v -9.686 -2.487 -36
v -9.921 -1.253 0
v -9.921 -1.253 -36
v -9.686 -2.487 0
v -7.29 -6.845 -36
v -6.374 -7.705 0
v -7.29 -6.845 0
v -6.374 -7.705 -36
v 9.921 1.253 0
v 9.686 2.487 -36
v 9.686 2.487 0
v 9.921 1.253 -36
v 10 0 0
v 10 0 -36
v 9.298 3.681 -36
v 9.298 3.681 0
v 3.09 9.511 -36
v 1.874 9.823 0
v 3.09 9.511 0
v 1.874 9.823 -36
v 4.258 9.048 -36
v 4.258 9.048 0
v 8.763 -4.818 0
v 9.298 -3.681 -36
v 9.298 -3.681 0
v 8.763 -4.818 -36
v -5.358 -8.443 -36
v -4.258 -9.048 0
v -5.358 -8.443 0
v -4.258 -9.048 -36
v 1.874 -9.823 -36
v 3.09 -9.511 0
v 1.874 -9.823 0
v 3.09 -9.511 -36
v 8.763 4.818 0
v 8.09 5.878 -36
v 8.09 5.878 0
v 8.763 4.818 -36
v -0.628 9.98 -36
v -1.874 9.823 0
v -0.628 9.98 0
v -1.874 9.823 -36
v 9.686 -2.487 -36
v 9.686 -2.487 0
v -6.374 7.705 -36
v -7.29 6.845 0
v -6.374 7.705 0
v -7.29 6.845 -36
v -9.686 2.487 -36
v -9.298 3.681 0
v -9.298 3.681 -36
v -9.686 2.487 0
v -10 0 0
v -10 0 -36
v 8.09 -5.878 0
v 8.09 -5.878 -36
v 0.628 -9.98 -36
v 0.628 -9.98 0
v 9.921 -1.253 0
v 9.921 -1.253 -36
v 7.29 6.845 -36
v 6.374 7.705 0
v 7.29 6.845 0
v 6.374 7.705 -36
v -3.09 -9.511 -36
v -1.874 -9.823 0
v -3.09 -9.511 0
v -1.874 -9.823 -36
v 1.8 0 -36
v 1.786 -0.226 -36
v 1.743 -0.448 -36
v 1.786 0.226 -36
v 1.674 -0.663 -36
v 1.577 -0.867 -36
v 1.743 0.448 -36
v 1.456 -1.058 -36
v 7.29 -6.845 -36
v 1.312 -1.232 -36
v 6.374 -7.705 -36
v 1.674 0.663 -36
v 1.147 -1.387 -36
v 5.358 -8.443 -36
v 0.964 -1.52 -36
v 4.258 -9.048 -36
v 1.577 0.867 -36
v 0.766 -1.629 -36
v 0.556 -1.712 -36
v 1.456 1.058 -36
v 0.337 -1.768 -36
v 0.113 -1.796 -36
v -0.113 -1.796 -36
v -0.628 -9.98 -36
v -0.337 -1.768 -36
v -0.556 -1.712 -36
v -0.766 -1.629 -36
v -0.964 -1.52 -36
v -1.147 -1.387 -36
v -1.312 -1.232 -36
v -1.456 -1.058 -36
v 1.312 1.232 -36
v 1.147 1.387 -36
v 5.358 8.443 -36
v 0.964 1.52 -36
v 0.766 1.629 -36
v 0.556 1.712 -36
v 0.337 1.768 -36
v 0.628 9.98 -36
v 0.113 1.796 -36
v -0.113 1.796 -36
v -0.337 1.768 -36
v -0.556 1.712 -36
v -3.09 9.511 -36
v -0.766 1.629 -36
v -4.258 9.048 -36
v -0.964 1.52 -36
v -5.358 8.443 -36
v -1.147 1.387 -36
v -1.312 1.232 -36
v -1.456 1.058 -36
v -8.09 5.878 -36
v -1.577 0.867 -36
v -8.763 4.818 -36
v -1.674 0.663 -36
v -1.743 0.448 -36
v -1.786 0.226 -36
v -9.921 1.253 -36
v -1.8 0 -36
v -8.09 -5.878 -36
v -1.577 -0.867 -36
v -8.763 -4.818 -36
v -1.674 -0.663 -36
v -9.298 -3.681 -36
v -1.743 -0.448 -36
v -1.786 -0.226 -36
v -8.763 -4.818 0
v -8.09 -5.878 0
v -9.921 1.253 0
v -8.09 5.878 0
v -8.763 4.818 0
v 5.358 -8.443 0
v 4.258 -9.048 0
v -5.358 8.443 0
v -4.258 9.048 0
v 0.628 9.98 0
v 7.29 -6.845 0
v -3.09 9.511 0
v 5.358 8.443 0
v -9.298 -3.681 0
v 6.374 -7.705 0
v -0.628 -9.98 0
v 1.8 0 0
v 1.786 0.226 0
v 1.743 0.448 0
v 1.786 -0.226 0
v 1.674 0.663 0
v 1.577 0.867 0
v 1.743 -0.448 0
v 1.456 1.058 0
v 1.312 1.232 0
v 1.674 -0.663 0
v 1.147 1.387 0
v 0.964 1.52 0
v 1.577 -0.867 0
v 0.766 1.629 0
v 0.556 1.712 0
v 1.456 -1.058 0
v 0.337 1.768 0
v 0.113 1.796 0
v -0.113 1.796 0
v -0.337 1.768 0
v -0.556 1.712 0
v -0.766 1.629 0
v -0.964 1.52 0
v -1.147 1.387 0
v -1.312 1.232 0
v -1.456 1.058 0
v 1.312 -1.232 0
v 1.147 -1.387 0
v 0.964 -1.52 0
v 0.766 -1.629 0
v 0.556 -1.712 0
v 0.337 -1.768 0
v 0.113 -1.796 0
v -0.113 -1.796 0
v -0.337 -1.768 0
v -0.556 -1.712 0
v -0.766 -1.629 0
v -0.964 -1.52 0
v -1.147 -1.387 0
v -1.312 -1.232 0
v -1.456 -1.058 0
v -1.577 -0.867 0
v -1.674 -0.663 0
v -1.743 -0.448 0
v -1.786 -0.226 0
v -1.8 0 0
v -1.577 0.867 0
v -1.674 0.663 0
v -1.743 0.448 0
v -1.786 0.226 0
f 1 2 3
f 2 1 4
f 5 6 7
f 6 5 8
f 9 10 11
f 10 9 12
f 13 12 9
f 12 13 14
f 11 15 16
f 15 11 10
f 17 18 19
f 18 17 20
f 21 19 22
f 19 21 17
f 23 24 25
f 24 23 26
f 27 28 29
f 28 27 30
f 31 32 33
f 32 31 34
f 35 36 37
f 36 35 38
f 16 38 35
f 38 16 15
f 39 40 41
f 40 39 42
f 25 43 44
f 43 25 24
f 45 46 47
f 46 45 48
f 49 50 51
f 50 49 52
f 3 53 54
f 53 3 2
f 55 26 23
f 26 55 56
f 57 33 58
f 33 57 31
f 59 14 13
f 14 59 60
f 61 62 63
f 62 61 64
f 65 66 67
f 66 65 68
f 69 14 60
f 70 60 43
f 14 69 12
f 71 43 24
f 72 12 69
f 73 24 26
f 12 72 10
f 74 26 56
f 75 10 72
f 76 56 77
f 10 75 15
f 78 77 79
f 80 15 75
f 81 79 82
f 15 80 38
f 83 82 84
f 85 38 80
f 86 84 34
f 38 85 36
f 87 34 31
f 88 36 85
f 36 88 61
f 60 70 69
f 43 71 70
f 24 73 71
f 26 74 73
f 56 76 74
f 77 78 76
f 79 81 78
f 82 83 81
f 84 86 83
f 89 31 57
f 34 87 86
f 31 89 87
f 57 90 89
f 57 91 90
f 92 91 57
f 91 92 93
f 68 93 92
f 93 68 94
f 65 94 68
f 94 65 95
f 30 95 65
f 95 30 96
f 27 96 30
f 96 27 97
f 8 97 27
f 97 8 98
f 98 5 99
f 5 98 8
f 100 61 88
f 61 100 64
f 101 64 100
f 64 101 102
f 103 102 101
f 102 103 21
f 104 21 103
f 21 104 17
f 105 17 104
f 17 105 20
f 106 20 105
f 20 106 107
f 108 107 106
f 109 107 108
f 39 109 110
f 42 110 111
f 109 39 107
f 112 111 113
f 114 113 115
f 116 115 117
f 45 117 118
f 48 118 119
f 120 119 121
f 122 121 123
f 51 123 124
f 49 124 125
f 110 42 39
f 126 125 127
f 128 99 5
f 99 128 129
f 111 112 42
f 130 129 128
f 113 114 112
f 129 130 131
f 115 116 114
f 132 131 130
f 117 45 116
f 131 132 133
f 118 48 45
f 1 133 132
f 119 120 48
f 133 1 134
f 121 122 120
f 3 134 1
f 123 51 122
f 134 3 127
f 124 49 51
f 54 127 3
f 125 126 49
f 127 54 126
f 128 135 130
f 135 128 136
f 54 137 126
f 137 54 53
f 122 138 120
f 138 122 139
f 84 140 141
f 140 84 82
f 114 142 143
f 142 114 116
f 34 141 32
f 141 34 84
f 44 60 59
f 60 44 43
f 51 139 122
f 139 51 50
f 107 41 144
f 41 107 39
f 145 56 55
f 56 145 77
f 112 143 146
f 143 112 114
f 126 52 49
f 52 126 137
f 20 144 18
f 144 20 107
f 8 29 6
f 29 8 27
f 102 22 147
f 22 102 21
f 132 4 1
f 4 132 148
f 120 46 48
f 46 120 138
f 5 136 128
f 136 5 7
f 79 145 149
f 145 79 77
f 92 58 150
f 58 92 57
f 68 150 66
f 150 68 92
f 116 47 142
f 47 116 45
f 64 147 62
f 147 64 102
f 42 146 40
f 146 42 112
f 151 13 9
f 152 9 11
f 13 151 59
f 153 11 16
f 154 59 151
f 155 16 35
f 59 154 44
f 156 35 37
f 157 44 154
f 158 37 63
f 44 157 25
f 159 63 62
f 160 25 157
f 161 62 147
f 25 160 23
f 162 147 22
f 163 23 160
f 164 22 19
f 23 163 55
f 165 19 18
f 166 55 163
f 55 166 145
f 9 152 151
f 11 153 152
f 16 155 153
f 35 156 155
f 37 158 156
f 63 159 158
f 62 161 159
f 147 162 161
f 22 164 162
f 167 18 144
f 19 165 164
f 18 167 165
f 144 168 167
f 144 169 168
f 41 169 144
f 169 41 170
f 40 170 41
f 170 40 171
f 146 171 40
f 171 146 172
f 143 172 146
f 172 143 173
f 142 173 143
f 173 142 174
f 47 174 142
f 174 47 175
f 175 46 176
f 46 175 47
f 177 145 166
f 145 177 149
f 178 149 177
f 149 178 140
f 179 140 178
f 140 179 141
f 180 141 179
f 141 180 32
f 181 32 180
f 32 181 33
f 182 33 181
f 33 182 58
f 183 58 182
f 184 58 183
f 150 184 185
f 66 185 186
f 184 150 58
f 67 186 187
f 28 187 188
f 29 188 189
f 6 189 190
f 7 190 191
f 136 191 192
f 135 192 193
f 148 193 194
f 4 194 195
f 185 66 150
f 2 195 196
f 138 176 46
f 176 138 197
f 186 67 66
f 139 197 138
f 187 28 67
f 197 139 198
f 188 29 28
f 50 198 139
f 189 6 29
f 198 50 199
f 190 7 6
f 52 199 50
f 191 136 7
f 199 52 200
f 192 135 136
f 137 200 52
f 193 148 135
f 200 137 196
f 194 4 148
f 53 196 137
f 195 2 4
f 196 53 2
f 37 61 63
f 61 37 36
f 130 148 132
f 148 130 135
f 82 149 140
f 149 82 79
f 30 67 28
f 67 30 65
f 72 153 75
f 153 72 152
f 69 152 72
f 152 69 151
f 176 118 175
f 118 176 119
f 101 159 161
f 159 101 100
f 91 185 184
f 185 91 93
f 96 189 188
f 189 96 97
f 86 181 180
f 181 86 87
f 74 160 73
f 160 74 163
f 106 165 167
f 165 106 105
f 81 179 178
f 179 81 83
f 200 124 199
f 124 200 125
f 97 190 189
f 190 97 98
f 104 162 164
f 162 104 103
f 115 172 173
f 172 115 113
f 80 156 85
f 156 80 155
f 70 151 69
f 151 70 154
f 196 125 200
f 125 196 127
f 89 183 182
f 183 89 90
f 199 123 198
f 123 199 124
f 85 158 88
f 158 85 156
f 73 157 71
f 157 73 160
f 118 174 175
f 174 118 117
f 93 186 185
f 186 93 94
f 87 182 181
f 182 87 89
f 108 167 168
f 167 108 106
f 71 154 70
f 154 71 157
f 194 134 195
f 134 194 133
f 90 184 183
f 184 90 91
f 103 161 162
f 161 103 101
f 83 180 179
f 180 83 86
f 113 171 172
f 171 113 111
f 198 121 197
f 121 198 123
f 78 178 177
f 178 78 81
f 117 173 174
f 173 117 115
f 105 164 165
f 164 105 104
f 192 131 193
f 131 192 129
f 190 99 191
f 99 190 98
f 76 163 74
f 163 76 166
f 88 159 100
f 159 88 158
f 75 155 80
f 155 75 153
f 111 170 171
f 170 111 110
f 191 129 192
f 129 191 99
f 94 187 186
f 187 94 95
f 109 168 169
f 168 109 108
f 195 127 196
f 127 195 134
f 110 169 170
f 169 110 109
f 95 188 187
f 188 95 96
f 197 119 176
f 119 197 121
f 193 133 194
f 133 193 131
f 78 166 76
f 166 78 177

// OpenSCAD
$fn = 50;


difference() {
	union() {
		translate(v = [0, 0, -36.0000000000]) {
			cylinder(h = 36, r = 10.0000000000);
		}
		cylinder(h = 0, r = 19.0000000000);
	}
	union() {
		#translate(v = [0, 0, -36]) {
			cylinder(h = 36, r = 1.8000000000);
		}
	}
}
